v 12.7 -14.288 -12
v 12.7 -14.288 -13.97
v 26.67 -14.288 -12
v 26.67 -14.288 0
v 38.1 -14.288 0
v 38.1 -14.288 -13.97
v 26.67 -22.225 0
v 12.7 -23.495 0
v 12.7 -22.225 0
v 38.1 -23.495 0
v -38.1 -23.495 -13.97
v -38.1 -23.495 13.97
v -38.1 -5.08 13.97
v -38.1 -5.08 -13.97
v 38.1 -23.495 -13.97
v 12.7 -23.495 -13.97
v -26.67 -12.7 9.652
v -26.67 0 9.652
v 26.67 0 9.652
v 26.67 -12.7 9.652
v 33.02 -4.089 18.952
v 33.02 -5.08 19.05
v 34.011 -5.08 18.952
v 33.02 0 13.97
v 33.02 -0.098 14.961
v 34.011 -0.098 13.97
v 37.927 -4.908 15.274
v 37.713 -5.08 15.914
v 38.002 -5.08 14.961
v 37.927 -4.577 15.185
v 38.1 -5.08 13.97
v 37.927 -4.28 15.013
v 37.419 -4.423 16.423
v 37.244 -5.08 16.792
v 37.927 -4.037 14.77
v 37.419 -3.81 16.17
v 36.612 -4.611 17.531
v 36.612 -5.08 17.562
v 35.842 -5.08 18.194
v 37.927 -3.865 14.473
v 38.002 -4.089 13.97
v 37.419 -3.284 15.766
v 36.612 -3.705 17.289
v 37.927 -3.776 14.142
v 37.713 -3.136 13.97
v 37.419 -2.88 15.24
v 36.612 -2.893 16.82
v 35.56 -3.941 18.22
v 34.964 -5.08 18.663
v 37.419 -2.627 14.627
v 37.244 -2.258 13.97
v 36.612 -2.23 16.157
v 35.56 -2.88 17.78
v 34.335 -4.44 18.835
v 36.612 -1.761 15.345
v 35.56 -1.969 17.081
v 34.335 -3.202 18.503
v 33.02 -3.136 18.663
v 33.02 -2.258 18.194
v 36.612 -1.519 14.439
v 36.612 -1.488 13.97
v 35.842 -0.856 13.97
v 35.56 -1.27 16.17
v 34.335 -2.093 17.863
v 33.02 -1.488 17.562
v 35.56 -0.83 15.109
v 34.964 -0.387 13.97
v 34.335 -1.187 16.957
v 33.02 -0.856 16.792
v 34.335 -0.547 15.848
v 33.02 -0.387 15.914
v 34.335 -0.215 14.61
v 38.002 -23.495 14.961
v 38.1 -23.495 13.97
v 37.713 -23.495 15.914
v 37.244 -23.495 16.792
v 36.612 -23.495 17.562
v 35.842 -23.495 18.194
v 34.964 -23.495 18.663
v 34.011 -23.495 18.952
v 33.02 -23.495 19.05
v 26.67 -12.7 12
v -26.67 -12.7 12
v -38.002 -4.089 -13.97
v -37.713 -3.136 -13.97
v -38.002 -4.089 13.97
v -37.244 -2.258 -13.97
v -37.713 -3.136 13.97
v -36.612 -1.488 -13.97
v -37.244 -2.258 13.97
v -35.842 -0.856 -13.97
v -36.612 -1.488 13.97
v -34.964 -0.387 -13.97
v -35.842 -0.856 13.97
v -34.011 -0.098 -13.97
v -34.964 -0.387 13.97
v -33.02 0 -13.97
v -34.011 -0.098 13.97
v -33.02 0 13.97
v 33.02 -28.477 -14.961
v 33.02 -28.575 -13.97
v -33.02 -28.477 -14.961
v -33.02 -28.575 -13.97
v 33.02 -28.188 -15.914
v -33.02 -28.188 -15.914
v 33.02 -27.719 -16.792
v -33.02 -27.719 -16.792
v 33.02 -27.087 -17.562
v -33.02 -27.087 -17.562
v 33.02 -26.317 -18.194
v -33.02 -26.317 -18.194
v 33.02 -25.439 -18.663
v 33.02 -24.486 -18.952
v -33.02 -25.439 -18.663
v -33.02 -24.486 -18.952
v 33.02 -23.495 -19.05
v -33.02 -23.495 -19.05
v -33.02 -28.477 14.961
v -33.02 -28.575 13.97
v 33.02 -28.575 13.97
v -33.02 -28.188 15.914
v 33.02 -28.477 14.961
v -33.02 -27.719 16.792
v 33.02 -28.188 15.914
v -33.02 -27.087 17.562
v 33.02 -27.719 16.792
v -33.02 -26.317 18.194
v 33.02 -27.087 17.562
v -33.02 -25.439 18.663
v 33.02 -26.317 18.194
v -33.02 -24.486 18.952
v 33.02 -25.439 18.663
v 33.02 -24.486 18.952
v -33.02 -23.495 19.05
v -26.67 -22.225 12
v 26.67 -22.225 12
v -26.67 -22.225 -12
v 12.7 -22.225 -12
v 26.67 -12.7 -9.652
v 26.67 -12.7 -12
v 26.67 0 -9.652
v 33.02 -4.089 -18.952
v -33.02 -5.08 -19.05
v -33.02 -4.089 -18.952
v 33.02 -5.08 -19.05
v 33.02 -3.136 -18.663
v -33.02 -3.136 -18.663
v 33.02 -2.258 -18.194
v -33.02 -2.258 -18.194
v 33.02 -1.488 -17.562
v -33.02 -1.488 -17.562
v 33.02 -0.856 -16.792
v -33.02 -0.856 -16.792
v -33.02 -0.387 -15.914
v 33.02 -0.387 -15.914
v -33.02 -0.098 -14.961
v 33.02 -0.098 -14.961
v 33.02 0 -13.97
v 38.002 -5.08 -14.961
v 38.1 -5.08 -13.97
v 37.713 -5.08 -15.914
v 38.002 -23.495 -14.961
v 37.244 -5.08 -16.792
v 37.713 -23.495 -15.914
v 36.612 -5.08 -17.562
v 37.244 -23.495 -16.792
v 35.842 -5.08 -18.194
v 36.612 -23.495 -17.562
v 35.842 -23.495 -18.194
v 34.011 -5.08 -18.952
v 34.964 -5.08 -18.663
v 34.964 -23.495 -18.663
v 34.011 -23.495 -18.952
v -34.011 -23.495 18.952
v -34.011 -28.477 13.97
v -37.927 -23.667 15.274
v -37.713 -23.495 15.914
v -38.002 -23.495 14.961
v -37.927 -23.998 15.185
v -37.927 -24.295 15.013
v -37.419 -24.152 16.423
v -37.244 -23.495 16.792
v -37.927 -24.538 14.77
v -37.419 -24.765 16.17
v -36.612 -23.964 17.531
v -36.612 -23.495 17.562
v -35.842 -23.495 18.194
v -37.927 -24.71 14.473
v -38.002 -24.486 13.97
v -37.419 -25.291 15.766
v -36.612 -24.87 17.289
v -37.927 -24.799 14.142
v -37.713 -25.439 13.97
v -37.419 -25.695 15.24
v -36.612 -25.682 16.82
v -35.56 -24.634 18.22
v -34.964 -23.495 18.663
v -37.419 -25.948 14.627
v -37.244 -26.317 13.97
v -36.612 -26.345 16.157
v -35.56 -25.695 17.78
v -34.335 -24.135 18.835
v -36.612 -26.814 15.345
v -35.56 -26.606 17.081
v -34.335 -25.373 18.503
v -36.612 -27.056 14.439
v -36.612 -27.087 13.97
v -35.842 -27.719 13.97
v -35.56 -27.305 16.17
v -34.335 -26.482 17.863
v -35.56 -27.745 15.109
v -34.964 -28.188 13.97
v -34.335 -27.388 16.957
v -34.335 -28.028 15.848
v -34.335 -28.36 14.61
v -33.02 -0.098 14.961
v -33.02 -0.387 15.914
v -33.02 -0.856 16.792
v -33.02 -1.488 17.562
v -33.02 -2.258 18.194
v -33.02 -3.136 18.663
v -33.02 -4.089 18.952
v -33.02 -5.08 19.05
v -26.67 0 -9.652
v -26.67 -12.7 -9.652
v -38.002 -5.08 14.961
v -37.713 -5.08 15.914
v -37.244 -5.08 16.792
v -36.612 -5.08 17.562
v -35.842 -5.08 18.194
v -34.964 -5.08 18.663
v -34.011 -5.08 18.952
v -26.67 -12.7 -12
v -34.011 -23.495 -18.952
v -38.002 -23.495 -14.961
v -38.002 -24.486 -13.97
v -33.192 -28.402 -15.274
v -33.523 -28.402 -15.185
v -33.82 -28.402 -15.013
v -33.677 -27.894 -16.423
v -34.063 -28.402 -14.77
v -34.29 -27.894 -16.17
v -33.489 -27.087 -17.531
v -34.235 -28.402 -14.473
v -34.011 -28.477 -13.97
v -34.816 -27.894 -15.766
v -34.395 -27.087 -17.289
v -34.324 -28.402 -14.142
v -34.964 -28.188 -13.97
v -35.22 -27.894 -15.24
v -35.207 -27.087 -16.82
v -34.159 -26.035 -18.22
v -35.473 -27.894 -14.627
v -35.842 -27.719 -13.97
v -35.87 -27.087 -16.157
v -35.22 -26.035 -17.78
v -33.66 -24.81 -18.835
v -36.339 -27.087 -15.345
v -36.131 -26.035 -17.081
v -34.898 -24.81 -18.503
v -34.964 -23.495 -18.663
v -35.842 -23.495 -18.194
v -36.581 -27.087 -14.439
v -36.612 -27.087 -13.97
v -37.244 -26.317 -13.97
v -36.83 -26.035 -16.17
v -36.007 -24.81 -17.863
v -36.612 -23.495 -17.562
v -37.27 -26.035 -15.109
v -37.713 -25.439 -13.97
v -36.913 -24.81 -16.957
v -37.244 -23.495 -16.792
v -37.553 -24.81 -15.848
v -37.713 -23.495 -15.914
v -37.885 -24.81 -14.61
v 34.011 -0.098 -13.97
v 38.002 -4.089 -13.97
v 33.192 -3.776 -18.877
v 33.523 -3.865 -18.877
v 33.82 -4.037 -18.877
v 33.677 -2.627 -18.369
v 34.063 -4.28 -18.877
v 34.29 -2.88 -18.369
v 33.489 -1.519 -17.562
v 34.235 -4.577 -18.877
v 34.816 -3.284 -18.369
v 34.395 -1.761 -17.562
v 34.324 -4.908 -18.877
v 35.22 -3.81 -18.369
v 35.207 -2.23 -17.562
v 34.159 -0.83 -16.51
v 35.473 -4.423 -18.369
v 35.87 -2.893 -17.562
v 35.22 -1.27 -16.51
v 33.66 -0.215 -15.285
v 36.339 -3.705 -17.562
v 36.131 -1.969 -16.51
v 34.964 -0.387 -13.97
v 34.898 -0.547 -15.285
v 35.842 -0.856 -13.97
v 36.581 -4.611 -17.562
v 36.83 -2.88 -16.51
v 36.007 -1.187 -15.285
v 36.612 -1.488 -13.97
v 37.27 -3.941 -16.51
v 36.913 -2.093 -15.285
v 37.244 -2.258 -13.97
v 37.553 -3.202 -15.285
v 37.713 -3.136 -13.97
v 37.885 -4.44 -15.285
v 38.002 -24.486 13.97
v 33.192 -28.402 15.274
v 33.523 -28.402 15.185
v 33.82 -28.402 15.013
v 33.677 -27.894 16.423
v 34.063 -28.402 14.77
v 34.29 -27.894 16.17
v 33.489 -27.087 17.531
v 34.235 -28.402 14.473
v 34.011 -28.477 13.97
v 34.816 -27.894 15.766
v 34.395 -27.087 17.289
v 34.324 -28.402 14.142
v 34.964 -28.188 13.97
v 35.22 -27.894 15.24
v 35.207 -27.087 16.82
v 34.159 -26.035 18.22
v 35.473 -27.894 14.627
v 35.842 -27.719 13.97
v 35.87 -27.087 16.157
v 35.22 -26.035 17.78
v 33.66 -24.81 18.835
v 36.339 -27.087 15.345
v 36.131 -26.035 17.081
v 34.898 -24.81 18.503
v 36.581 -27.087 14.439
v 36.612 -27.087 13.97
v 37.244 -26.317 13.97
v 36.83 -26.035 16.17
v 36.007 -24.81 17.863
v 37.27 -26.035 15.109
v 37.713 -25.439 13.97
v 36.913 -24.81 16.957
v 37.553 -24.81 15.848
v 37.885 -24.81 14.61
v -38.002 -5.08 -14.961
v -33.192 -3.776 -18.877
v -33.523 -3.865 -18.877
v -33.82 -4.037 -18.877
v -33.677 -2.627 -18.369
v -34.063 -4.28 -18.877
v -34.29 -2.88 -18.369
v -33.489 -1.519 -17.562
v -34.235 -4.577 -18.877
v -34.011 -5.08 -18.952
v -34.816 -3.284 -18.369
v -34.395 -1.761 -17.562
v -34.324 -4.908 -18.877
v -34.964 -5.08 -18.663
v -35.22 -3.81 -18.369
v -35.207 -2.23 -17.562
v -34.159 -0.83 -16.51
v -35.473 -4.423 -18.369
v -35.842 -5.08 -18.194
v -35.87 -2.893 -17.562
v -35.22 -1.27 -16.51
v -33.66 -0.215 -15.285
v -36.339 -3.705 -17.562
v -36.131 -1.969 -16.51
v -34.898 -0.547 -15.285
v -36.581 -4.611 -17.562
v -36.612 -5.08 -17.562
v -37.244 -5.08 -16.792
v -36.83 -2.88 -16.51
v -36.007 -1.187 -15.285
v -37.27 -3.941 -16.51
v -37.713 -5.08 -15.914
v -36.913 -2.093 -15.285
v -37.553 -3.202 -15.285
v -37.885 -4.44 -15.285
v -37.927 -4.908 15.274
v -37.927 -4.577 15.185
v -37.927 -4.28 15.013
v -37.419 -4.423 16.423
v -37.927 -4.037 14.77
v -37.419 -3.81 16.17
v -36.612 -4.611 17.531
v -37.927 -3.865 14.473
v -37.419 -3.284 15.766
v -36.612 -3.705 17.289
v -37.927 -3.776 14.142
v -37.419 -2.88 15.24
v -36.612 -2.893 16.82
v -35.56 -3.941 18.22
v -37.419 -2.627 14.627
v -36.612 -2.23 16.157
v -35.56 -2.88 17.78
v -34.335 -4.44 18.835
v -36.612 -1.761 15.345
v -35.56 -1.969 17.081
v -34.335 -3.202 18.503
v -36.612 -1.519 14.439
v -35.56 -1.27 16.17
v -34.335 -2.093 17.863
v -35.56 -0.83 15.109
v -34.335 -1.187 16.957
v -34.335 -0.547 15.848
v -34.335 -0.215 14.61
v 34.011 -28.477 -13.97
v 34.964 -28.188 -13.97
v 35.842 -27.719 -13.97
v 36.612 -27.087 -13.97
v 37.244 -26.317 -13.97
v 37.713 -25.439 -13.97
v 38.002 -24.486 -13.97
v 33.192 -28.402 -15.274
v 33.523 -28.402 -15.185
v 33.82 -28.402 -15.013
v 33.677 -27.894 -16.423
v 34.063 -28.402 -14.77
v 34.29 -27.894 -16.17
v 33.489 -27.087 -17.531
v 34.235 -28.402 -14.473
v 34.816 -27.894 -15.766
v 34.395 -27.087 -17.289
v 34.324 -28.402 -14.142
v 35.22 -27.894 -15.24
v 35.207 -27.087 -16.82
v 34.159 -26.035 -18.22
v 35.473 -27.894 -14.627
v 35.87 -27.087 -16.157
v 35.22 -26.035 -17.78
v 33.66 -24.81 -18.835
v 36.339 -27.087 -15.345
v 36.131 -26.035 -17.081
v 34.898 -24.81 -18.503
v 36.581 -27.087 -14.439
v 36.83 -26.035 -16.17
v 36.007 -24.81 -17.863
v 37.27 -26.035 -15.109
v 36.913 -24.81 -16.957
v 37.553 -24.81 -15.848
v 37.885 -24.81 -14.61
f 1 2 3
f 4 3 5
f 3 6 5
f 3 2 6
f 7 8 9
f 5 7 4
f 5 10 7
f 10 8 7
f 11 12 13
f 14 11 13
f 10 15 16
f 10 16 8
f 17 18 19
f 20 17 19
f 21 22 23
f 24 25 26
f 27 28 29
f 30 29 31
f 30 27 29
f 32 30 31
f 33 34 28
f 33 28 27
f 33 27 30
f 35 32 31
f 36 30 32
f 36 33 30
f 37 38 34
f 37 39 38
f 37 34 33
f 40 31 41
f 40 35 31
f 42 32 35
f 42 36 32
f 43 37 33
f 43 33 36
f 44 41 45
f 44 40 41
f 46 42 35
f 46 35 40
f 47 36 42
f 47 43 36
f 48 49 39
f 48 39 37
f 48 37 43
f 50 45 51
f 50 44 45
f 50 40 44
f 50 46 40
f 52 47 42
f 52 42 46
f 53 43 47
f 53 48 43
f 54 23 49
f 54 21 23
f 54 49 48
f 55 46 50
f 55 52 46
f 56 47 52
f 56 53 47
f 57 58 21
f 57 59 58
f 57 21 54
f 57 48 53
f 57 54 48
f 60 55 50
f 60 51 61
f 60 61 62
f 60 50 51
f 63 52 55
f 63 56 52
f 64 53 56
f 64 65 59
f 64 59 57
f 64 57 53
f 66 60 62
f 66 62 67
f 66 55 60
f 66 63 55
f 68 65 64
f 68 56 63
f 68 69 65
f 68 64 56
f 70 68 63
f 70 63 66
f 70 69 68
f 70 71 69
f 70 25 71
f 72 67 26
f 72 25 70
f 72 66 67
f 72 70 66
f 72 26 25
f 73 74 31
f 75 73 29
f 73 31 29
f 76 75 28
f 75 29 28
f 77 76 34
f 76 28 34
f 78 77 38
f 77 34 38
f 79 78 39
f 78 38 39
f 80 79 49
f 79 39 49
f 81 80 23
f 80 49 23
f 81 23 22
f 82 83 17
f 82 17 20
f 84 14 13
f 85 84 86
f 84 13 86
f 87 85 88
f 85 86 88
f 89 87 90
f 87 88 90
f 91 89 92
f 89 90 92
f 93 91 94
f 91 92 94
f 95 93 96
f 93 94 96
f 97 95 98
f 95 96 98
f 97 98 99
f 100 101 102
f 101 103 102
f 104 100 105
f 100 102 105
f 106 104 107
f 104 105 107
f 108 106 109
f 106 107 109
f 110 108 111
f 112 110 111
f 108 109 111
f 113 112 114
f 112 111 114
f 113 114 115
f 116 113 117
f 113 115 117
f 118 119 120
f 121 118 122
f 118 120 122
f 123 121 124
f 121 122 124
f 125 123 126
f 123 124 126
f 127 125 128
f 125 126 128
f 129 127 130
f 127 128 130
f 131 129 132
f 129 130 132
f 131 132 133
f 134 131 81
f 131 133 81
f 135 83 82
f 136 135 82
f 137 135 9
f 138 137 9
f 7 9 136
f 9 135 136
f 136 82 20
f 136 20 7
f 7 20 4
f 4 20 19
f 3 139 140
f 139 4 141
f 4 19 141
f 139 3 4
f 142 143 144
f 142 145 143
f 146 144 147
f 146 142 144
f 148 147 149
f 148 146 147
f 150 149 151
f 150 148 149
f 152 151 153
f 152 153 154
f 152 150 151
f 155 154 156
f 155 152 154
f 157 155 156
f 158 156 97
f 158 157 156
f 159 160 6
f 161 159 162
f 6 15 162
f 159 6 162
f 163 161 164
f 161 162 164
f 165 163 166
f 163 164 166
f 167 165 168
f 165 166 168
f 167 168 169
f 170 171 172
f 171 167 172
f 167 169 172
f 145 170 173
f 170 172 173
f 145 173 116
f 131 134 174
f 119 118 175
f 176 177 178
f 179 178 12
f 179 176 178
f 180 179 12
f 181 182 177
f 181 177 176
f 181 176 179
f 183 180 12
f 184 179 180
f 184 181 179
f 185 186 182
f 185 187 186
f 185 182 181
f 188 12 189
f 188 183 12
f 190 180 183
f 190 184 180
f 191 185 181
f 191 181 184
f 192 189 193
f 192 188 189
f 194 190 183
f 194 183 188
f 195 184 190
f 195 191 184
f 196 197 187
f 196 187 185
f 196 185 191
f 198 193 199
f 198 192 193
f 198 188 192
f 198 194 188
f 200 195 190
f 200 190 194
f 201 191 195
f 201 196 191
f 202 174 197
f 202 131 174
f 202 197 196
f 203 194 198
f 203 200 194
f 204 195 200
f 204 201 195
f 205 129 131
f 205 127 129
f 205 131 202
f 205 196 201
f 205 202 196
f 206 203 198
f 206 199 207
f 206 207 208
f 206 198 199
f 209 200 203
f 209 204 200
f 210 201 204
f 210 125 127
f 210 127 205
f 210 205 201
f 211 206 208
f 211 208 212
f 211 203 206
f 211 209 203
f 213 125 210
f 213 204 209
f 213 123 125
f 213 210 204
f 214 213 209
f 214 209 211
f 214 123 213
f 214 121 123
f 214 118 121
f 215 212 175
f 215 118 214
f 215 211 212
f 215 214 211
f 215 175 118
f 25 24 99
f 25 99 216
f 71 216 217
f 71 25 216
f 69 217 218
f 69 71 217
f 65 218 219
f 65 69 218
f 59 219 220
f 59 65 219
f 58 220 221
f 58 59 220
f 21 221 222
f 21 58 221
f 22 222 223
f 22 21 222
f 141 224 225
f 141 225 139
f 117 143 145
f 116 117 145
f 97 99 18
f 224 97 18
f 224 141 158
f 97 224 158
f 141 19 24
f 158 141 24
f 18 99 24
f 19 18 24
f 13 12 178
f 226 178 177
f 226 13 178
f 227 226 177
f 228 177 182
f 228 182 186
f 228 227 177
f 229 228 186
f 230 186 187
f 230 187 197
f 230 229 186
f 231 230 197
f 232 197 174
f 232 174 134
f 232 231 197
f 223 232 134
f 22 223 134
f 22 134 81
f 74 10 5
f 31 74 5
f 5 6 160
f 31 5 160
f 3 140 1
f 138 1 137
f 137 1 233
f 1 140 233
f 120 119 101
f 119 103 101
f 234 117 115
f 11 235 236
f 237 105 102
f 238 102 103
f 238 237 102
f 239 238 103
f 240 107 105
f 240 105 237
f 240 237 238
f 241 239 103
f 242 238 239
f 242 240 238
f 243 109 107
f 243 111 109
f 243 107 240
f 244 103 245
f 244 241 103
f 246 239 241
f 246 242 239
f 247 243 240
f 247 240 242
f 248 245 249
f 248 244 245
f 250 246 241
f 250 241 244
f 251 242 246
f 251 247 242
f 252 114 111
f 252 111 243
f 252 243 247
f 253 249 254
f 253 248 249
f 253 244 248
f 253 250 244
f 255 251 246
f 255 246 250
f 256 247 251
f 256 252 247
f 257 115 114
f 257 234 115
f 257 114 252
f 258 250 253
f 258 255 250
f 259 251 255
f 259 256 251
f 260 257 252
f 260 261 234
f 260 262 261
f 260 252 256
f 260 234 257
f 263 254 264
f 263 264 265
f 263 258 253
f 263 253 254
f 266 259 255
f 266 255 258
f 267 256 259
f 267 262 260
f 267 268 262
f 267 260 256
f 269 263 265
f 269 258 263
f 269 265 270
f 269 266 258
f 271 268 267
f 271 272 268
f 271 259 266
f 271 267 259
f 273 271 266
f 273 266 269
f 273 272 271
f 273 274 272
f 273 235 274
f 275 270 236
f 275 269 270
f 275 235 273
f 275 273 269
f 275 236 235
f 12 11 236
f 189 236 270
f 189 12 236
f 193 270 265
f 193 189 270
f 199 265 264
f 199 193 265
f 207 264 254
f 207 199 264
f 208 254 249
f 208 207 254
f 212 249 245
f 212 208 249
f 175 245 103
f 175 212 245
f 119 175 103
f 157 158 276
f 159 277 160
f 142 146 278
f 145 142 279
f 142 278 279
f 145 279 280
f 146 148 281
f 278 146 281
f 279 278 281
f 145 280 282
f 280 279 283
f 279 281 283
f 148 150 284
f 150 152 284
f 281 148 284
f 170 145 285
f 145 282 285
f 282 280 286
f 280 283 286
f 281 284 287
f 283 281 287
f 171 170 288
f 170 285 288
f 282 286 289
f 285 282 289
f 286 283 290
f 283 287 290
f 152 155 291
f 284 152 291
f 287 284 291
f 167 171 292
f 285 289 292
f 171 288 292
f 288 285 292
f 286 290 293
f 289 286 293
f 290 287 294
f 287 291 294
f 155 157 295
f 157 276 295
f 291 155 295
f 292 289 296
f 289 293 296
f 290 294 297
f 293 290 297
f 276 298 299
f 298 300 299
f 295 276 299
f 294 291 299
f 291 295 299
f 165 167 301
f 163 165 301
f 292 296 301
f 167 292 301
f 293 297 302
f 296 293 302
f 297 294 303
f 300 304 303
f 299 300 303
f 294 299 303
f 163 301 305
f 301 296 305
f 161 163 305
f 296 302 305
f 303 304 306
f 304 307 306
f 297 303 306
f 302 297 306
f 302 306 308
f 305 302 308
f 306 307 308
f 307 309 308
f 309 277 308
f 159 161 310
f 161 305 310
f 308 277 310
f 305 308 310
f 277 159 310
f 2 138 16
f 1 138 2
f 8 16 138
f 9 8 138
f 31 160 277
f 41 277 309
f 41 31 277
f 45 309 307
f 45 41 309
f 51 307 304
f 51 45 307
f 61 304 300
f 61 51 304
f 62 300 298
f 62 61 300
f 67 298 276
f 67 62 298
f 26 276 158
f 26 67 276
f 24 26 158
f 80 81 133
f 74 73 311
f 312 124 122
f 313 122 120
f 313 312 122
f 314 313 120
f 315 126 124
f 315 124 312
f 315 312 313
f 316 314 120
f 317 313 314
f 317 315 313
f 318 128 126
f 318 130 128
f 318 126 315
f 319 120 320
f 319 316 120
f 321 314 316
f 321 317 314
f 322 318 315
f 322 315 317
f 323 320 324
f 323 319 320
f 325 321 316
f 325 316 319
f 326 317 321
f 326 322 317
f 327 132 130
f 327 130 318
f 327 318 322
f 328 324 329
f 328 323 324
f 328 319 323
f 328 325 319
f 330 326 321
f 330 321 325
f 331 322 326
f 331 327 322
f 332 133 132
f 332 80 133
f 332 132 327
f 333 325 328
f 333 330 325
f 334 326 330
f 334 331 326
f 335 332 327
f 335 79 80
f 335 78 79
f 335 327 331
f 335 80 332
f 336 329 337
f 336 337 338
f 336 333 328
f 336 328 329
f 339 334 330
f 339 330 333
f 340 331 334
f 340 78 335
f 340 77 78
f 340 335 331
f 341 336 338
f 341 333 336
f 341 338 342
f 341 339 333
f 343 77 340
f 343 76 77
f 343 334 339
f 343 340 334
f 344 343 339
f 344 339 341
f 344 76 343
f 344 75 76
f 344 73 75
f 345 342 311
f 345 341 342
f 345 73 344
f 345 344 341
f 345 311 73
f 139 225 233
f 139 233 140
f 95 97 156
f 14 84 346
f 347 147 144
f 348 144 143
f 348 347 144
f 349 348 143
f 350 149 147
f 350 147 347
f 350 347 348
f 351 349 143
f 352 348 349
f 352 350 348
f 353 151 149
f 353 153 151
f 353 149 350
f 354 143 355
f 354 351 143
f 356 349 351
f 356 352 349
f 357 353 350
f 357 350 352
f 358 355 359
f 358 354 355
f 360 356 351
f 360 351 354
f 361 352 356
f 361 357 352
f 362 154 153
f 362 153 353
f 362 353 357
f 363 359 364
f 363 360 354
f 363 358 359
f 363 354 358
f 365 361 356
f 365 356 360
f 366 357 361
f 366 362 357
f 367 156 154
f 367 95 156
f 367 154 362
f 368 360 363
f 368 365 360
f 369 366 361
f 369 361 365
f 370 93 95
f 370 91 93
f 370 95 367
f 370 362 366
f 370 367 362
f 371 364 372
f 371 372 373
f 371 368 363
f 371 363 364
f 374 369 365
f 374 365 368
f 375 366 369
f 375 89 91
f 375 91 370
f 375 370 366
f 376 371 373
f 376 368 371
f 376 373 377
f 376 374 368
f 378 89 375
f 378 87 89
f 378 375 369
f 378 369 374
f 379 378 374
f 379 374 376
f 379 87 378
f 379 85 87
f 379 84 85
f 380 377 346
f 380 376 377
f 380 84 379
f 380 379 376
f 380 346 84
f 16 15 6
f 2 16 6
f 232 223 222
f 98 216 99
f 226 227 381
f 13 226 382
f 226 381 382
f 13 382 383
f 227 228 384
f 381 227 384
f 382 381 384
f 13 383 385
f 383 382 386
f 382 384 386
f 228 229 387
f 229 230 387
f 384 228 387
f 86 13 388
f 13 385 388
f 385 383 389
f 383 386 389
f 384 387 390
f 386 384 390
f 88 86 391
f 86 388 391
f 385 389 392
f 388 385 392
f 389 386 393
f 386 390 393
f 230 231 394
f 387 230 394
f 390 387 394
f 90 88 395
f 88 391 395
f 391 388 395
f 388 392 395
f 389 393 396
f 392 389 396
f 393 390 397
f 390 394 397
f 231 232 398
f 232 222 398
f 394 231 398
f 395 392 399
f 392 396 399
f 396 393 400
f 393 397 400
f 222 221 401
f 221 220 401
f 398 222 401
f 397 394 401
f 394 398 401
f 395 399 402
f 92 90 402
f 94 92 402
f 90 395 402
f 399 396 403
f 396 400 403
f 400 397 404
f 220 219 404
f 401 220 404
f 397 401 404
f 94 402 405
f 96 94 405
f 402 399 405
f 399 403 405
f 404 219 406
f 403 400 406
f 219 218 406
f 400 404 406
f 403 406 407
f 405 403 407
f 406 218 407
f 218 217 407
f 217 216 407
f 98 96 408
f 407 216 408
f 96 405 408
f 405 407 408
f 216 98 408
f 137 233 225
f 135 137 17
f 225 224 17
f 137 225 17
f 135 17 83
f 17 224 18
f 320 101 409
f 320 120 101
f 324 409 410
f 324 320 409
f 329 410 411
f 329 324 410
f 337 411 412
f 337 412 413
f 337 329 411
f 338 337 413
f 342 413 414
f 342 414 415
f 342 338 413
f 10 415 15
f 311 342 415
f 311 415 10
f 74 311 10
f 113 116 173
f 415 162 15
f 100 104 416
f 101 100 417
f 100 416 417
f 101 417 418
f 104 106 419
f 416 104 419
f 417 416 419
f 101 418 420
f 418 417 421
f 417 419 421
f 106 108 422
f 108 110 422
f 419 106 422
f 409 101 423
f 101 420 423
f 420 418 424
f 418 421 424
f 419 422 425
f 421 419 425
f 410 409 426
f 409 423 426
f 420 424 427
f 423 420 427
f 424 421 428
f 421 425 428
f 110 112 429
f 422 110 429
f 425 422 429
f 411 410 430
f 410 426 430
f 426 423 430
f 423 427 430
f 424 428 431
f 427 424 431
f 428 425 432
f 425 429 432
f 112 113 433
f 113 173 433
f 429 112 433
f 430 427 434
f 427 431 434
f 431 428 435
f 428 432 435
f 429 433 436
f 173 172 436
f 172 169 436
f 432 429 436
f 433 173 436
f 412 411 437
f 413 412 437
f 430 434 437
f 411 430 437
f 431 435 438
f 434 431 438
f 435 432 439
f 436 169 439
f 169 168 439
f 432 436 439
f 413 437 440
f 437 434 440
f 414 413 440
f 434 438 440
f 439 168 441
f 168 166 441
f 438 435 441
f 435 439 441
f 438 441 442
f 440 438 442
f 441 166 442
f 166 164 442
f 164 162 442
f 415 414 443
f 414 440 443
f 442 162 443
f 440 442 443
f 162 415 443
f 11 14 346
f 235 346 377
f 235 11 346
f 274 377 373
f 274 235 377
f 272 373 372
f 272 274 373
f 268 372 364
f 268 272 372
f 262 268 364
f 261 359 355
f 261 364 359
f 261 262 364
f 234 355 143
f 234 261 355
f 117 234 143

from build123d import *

# Parameters (mm, degrees)
F0_W      = 76.2
F0_H      = 38.1
F0_W_2    = 53.34
F0_H_2    = 19.304
F1_DEPTH  = 12.7
F2_W      = 76.2
F2_H      = 38.1
F3_DEPTH  = 12.7
F4_W      = 53.34
F4_H      = 3.175
F5_DEPTH  = 31.05
F5_FACE_W = 76.2
F5_FACE_H = 3.175
F6_DEPTH  = 7.05
F7_R      = 5.08
F8_W      = 9.2075
F8_H      = 13.97
F9_DEPTH  = 25.4


with BuildPart() as f1:
    # F0 (on Front) → F1 (new body)
    with BuildSketch(Plane.XZ):
        Rectangle(F0_W, F0_H)
        Rectangle(F0_W_2, F0_H_2, mode=Mode.SUBTRACT)
    extrude(amount=F1_DEPTH)

    # F2 (on face) → F3 (join)
    with BuildSketch(Plane.XZ.offset(12.7)):
        Rectangle(F2_W, F2_H)
        Polygon((-26.67, 12), (26.67, 12), (26.67, 9.652), (26.67, -9.652), (26.67, -12), (-26.67, -12), (-26.67, -9.652), (-26.67, 9.652), align=None, mode=Mode.SUBTRACT)
    extrude(amount=F3_DEPTH)

    # F4 (on face) → F5 (join, through all)
    with BuildSketch(Plane(origin=(0, 0, 12), x_dir=(1, 0, 0), z_dir=(0, 0, -1))):
        Polygon((38.1, 22.225), (38.1, 28.575), (-38.1, 28.575), (-38.1, 22.225), (-26.67, 22.225), (-26.67, 25.4), (26.67, 25.4), (26.67, 22.225), align=None)
        with Locations((0, 23.8125)):
            Rectangle(F4_W, F4_H)
    extrude(amount=F5_DEPTH)

    # F5_face (on face) → F6 (join, through all)
    with BuildSketch(Plane(origin=(0, -26.9875, 12), x_dir=(1, 0, 0), z_dir=(0, 0, 1))):
        Rectangle(F5_FACE_W, F5_FACE_H)
    extrude(amount=F6_DEPTH)

    # F7
    f7_edges = [f1.edges().sort_by_distance(p)[0] for p in [
        (0, 0, 19.05),
        (38.1, -14.2875, 19.05),
        (0, -28.575, 19.05),
        (-38.1, -14.2875, 19.05),
        (-38.1, 0, 0),
        (38.1, 0, 0),
        (0, 0, -19.05),
        (38.1, -14.2875, -19.05),
        (-38.1, -14.2875, -19.05),
        (0, -28.575, -19.05),
        (38.1, -28.575, 0),
        (-38.1, -28.575, 0),
    ]]
    fillet(f7_edges, radius=F7_R)

    # F8 (on face) → F9 (cut)
    with BuildSketch(Plane.YZ.offset(38.1)):
        with Locations((-18.89125, -6.985)):
            Rectangle(F8_W, F8_H)
    extrude(amount=-F9_DEPTH, mode=Mode.SUBTRACT)


solid = f1.part
